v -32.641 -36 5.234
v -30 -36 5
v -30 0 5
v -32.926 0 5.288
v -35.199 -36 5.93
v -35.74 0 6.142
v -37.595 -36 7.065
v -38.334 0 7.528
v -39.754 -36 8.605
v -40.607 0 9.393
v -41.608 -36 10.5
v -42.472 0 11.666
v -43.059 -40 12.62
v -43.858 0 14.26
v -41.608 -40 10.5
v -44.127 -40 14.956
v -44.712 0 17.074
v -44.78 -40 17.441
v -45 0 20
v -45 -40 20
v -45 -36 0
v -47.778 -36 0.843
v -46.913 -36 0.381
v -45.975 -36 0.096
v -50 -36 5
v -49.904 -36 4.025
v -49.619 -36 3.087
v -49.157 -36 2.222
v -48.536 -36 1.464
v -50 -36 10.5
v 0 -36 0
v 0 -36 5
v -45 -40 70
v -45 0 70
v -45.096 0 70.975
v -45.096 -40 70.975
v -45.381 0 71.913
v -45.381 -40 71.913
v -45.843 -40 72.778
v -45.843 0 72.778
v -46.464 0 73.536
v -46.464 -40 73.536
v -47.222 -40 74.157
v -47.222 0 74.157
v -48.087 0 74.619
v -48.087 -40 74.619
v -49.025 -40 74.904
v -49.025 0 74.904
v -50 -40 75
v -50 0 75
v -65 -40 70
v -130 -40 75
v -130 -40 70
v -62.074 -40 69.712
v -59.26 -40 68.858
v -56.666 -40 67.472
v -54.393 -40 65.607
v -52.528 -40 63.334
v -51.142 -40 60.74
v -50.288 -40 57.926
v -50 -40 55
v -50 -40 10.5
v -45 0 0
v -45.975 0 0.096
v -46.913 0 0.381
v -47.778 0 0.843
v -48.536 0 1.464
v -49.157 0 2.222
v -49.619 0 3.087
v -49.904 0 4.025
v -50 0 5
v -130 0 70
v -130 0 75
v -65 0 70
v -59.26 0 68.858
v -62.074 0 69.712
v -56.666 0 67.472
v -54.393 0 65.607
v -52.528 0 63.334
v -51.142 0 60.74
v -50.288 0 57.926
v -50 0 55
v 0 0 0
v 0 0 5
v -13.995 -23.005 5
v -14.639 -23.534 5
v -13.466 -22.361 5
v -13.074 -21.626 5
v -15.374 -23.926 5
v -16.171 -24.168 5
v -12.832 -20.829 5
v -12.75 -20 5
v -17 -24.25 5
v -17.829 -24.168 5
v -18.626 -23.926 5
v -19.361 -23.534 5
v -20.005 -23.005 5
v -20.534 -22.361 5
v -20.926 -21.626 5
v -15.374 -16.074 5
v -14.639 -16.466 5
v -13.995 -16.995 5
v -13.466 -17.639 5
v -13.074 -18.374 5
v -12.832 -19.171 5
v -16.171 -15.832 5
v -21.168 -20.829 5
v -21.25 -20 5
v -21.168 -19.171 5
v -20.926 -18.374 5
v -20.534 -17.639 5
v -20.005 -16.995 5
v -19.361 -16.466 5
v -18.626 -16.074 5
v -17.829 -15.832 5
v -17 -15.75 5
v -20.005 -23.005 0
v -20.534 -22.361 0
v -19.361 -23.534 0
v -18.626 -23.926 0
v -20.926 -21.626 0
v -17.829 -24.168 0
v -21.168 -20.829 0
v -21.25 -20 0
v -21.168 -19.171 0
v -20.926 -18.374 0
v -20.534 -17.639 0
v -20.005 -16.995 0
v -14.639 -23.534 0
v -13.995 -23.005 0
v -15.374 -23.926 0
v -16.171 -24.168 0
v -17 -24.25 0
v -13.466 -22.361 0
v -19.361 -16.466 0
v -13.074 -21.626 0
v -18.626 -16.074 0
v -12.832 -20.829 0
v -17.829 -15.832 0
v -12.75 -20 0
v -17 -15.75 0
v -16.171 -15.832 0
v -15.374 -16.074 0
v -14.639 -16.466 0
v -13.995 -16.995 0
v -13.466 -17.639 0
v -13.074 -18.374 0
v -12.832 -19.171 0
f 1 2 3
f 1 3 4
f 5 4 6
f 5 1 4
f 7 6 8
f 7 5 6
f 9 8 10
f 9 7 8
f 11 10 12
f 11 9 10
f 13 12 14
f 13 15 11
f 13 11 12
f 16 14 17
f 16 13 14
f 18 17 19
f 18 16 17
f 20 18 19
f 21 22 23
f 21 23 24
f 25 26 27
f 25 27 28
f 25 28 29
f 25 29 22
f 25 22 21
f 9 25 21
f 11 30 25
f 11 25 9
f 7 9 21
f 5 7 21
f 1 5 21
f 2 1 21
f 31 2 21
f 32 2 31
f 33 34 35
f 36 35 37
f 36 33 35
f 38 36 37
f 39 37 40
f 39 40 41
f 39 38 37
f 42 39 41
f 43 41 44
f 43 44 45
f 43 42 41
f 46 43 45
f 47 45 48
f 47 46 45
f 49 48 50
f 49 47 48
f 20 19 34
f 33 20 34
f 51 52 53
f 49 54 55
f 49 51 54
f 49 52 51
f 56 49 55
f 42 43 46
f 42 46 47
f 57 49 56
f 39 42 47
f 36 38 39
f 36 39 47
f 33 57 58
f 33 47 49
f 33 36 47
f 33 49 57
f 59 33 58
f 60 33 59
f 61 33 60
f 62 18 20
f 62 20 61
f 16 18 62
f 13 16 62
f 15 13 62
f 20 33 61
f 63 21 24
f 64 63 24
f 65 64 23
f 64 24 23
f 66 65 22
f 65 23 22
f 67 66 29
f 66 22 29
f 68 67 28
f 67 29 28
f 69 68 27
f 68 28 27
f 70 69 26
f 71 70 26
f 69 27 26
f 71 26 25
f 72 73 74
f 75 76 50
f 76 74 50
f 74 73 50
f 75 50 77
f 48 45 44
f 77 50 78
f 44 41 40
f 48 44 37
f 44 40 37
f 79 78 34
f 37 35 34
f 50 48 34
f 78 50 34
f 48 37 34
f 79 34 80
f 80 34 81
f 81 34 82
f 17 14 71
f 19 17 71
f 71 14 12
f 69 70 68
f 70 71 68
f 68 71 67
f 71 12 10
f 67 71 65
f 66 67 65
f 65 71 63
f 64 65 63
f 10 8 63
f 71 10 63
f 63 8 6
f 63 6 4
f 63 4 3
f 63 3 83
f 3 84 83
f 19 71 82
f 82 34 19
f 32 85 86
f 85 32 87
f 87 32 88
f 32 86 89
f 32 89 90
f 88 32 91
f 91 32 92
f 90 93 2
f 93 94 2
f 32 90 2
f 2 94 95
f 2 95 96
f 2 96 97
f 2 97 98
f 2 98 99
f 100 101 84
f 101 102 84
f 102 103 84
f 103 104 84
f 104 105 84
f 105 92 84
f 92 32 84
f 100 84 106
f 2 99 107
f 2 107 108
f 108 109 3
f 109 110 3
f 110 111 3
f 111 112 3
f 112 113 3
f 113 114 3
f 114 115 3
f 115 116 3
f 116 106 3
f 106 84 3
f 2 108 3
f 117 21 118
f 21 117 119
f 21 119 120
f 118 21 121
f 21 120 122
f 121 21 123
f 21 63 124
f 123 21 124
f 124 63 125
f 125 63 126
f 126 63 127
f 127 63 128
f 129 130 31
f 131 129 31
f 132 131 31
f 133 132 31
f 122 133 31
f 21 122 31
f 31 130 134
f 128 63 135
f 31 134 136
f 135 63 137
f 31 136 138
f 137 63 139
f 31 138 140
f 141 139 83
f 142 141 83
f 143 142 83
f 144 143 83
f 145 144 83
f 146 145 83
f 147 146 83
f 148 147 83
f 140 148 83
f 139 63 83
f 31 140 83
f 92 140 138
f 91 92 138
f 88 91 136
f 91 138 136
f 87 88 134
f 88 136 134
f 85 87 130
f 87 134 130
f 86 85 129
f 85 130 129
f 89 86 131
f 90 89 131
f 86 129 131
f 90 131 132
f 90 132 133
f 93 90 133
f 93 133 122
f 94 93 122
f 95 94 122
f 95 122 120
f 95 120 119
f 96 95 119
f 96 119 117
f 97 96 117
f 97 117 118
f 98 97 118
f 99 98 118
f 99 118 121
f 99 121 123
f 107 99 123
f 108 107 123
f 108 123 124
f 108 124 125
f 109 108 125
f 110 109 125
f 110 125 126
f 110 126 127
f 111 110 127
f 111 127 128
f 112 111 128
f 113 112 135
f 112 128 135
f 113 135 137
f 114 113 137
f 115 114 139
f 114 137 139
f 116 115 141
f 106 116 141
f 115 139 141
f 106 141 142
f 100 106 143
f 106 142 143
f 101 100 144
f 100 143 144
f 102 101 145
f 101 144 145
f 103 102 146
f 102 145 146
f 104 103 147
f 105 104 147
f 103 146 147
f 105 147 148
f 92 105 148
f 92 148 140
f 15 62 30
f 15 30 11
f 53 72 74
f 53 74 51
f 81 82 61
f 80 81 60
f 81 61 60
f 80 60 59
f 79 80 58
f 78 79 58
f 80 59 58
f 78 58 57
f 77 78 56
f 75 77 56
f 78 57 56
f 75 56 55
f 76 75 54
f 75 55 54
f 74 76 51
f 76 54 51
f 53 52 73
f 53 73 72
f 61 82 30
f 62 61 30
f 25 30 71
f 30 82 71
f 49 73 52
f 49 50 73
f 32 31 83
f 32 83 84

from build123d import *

# Parameters (mm, degrees)
F1_DEPTH = 40
F2_R     = 4.25
F3_DEPTH = 25
F4_R     = 15
F5_R     = 5
F6_W     = 56.803
F6_H     = 10.5
F7_DEPTH = 4
F8_DEPTH = 5


with BuildPart() as f1:
    # F0 (on Front) → F1 (new body)
    with BuildSketch(Plane.XZ):
        Polygon((-45, 0), (0, 0), (0, 5), (-45, 5), (-45, 70), (-45, 75), (-125, 75), (-125, 70), (-50, 70), (-50, 0), align=None)
    extrude(amount=F1_DEPTH)

    # F2 (on face) → F3 (cut)
    with BuildSketch(Plane(origin=(0, 0, 0), x_dir=(1, 0, 0), z_dir=(0, 0, -1))):
        with Locations((-17, 20)):
            Circle(F2_R)
    extrude(amount=-F3_DEPTH, mode=Mode.SUBTRACT)

    # F4
    f4_edges = [f1.edges().sort_by_distance(p)[0] for p in [
        (-45, -20, 5),
        (-50, -20, 70),
    ]]
    fillet(f4_edges, radius=F4_R)

    # F5
    f5_edges = [f1.edges().sort_by_distance(p)[0] for p in [
        (-45, -20, 75),
        (-50, -20, 0),
    ]]
    fillet(f5_edges, radius=F5_R)

    # F6 (on face) → F7 (cut)
    with BuildSketch(Plane.XZ.offset(40)):
        with Locations((-28.4015, 5.25)):
            Rectangle(F6_W, F6_H)
    extrude(amount=-F7_DEPTH, mode=Mode.SUBTRACT)

    # F8 (add): a face of the model
    f8_faces = [f1.faces().sort_by_distance(p)[0] for p in [
        (-125, -20, 72.5),
    ]]
    extrude(f8_faces, amount=F8_DEPTH)


solid = f1.part
